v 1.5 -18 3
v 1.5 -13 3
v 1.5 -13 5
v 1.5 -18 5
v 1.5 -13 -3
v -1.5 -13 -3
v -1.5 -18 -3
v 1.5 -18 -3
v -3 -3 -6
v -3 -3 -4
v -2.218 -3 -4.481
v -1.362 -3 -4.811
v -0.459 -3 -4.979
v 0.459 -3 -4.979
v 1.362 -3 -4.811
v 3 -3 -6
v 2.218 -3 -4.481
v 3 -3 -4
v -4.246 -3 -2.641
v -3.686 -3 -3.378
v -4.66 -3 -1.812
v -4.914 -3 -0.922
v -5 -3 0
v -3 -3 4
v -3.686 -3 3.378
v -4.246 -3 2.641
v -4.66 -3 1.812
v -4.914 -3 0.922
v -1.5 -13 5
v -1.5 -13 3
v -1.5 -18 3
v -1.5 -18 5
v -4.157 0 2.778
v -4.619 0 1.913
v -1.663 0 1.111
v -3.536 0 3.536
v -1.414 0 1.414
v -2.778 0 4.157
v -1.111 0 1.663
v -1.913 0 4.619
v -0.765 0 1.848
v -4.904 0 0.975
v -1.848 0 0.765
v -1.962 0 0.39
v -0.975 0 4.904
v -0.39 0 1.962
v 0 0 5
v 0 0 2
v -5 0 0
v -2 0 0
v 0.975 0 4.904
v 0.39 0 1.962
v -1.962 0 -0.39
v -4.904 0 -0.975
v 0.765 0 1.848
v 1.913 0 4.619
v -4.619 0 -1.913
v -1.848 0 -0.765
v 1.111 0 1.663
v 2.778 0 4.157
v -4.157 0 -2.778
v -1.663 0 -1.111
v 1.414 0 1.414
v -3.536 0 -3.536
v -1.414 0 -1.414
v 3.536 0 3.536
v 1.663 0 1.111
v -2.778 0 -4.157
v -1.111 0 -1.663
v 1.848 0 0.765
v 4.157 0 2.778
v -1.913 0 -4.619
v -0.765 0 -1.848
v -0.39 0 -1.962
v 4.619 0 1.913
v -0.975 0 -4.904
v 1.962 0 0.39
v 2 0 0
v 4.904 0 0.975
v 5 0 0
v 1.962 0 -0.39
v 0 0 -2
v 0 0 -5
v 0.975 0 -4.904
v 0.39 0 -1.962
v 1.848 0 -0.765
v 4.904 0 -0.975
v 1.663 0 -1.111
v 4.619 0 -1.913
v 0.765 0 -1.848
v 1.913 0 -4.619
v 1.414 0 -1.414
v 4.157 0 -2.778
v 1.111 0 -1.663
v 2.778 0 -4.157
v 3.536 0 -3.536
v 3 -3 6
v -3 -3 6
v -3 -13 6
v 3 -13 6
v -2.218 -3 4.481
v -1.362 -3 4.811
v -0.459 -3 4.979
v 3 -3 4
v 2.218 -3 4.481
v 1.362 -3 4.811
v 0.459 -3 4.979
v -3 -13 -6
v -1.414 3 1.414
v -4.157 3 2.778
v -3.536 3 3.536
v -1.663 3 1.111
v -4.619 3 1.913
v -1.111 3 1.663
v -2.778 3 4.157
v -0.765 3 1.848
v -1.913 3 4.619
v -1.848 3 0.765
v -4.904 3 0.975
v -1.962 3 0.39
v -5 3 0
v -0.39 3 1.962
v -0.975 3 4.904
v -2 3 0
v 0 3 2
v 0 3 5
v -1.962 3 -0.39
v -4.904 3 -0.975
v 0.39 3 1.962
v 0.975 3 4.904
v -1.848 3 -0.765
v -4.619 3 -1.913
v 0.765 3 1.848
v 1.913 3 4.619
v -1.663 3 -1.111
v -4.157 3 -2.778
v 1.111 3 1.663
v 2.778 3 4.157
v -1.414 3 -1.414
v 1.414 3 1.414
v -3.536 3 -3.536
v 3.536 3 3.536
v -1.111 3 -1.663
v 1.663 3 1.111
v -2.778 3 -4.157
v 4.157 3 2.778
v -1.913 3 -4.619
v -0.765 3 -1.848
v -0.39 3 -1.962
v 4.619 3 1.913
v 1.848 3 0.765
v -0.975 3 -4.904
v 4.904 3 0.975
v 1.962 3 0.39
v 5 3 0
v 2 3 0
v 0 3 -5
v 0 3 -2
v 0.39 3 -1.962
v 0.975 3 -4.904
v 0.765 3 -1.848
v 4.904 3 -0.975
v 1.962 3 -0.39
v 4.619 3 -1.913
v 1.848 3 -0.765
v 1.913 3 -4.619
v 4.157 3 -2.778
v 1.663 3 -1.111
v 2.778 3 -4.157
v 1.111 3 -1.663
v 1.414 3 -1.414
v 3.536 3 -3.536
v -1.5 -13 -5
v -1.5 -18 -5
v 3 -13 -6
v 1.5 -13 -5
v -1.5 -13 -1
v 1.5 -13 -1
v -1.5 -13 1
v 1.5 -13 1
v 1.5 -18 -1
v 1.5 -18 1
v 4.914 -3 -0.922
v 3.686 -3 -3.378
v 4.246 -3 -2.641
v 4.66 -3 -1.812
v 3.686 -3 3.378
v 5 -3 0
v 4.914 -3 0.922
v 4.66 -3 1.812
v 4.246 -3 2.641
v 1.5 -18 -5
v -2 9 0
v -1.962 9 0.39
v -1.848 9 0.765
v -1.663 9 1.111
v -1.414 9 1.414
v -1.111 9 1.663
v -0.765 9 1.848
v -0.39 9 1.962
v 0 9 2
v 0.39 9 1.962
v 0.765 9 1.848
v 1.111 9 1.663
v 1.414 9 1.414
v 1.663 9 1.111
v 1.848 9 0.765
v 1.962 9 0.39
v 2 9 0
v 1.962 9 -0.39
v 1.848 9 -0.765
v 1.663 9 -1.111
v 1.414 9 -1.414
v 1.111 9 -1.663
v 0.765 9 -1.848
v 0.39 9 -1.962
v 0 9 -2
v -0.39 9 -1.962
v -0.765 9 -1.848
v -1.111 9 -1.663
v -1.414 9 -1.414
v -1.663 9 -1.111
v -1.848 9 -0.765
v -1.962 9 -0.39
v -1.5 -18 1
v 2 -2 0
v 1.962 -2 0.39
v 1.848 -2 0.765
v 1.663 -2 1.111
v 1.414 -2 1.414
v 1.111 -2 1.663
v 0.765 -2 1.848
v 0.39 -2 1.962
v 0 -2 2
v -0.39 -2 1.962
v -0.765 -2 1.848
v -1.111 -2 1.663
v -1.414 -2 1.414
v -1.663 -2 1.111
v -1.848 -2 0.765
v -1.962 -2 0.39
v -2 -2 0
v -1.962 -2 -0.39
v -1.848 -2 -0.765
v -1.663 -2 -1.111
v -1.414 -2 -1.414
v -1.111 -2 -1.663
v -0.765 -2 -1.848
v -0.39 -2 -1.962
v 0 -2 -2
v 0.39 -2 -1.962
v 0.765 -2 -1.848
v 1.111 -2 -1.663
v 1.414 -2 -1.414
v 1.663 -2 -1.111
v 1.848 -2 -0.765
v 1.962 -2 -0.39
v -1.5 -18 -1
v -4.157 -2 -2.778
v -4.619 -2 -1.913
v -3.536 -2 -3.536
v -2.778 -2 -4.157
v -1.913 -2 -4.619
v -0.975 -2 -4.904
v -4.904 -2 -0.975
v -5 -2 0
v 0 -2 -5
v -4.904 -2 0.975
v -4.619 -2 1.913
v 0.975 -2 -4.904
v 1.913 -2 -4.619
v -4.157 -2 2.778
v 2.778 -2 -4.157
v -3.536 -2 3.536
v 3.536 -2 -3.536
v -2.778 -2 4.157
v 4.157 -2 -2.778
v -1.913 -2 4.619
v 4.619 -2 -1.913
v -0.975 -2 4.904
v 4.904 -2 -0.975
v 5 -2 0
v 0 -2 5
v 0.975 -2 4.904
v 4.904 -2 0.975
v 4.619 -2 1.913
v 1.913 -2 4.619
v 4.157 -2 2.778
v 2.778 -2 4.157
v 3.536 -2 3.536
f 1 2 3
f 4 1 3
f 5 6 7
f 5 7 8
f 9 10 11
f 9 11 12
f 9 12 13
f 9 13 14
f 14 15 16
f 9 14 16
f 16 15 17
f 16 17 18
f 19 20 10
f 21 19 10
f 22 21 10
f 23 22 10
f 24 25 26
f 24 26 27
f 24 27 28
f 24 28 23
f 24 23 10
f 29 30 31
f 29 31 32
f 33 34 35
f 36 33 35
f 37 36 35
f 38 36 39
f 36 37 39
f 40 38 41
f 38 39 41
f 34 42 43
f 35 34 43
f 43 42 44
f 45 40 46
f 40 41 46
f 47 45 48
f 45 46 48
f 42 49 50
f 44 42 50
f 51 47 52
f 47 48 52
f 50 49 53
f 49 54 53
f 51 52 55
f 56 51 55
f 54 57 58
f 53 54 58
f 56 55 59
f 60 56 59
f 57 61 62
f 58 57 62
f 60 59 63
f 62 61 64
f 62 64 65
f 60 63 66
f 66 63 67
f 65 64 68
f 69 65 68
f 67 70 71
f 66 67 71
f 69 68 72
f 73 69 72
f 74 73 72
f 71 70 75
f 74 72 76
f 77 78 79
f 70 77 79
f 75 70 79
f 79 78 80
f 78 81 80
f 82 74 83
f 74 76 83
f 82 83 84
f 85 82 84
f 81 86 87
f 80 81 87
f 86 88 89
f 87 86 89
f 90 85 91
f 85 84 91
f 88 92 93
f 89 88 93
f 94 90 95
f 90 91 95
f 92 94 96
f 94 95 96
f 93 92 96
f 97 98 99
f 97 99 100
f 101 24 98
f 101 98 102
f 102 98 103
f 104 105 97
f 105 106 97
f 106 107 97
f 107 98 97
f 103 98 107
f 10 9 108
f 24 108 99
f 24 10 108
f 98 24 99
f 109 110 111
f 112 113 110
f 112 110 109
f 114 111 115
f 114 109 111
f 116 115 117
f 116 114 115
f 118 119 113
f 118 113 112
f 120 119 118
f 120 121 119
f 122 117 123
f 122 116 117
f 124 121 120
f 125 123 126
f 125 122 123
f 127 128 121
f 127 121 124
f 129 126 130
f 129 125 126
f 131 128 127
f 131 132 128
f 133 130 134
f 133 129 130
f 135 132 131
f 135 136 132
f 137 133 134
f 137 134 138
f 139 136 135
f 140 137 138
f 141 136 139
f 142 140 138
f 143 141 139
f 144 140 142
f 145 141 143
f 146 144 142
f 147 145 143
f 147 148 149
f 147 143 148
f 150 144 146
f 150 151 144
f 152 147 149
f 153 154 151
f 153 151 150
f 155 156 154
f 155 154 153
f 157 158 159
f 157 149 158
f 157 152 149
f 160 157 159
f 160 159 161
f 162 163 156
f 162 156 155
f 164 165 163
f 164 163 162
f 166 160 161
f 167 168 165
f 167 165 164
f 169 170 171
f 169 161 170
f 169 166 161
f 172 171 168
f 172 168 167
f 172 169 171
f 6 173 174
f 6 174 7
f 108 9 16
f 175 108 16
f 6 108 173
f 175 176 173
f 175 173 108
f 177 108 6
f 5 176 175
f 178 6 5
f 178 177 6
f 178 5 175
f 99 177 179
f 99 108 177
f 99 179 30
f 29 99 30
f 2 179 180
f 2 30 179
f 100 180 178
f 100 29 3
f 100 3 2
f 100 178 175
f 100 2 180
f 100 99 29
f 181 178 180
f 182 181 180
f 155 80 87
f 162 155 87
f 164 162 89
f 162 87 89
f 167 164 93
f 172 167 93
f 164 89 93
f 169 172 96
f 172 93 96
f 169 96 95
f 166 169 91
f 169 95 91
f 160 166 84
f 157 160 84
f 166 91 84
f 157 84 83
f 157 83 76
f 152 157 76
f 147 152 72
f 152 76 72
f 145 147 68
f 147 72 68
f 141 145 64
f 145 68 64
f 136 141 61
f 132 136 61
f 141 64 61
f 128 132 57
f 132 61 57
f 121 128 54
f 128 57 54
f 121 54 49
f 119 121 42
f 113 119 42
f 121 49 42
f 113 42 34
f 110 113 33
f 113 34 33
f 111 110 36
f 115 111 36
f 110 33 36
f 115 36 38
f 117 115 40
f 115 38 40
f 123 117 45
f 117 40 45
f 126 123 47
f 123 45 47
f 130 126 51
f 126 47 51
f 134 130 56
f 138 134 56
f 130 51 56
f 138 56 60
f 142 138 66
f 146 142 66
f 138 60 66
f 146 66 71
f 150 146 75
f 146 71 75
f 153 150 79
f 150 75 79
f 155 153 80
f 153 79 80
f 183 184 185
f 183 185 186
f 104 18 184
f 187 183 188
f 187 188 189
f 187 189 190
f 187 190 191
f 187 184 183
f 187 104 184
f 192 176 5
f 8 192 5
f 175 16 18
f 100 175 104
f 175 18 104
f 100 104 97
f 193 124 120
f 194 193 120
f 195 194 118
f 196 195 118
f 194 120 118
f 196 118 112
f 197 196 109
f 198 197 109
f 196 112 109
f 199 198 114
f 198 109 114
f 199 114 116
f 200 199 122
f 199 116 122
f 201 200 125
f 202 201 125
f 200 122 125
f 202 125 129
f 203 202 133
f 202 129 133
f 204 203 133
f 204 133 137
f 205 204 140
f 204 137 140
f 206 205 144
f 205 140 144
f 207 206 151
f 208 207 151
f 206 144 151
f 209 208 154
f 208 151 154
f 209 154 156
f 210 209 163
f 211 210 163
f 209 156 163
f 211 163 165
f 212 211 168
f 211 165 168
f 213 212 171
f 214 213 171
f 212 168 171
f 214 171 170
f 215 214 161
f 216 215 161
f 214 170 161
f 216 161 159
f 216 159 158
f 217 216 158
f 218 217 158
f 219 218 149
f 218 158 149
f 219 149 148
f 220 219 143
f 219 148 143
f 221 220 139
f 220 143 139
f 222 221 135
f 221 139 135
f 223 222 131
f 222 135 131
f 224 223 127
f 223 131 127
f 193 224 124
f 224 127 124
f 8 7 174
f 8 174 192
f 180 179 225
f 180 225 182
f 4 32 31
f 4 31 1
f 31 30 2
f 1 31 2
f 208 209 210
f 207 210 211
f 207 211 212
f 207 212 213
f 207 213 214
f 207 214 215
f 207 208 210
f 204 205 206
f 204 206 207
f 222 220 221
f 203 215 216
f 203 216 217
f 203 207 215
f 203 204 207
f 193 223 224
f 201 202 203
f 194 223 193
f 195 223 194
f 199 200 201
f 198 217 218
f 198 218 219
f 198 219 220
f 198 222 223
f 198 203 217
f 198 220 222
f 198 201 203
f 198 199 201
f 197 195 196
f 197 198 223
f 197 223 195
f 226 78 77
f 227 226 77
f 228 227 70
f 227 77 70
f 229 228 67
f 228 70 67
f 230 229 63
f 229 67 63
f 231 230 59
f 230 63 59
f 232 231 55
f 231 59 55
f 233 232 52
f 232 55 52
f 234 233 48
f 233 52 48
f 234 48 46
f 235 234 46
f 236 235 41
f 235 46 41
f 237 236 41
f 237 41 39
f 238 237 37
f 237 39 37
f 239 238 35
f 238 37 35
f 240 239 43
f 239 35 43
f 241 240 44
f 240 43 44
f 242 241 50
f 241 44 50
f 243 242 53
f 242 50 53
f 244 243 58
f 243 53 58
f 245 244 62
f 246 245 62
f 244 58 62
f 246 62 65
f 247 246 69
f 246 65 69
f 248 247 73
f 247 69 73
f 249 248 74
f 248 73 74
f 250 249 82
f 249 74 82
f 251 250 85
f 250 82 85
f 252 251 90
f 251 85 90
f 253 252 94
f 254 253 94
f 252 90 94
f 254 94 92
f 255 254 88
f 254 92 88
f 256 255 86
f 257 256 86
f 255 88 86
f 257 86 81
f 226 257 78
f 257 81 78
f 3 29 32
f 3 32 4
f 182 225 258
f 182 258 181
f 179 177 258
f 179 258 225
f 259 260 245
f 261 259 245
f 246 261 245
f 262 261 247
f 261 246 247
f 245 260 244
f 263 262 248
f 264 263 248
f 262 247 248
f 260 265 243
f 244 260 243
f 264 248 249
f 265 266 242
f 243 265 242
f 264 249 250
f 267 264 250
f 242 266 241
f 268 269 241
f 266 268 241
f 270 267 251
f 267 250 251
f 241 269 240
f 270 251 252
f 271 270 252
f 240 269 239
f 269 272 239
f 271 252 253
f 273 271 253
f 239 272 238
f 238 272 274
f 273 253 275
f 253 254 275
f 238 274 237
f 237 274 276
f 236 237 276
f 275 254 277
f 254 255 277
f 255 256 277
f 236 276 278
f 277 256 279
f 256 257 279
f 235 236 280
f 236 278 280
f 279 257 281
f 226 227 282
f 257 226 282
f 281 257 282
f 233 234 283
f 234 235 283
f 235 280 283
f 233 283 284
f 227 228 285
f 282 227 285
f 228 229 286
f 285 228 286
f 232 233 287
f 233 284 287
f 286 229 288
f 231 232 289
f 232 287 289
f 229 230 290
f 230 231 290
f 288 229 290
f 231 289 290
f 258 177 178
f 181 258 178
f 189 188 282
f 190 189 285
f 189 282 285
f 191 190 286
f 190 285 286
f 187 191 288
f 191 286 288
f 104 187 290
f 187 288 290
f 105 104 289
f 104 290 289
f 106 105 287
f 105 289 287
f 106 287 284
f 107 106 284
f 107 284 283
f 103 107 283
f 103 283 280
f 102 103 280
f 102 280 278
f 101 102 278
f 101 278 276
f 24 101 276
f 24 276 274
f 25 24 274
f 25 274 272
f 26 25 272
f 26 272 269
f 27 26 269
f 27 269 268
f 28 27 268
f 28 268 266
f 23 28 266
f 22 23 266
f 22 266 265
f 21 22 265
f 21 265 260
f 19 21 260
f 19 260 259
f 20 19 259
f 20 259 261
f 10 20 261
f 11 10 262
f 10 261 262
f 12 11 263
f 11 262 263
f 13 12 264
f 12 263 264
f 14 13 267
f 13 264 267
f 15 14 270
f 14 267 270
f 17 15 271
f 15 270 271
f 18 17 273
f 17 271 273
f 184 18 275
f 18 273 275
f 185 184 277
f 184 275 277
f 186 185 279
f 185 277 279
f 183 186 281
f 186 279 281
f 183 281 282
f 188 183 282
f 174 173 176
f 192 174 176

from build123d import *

# Parameters (mm, degrees)
ESQUISSE1_R      = 5
EXTRUSION1_DEPTH = 3
ESQUISSE2_R      = 2
EXTRUSION2_DEPTH = 6
ESQUISSE3_R      = 2
EXTRUSION3_DEPTH = 2
ESQUISSE4_R      = 5
EXTRUSION4_DEPTH = 1
ESQUISSE5_W      = 6
ESQUISSE5_H      = 12
EXTRUSION5_DEPTH = 10
ESQUISSE6_W      = 3
ESQUISSE6_H      = 2
EXTRUSION6_DEPTH = 5


with BuildPart() as part:
    # Esquisse1 → Extrusion1 (new body)
    with BuildSketch(Plane(origin=(0, 0, 0), x_dir=(1, 0, 0), z_dir=(0, 1, 0))):
        Circle(ESQUISSE1_R)
    extrude(amount=EXTRUSION1_DEPTH)

    # Esquisse2 → Extrusion2 (add)
    with BuildSketch(Plane(origin=(0, 3, 0), x_dir=(-1, 0, 0), z_dir=(0, 1, 0))):
        Circle(ESQUISSE2_R)
    extrude(amount=EXTRUSION2_DEPTH)

    # Esquisse3 → Extrusion3 (add)
    with BuildSketch(Plane.XZ):
        Circle(ESQUISSE3_R)
    extrude(amount=EXTRUSION3_DEPTH)

    # Esquisse4 → Extrusion4 (add)
    with BuildSketch(Plane.XZ.offset(2)):
        Circle(ESQUISSE4_R)
    extrude(amount=EXTRUSION4_DEPTH)

    # Esquisse5 → Extrusion5 (add)
    with BuildSketch(Plane.XZ.offset(3)):
        Rectangle(ESQUISSE5_W, ESQUISSE5_H)
    extrude(amount=EXTRUSION5_DEPTH)

    # Esquisse6 → Extrusion6 (add)
    with BuildSketch(Plane.XZ.offset(13)):
        with Locations((0, 4)):
            Rectangle(ESQUISSE6_W, ESQUISSE6_H)
        Rectangle(ESQUISSE6_W, ESQUISSE6_H)
        with Locations((0, -4)):
            Rectangle(ESQUISSE6_W, ESQUISSE6_H)
    extrude(amount=EXTRUSION6_DEPTH)


solid = part.part
